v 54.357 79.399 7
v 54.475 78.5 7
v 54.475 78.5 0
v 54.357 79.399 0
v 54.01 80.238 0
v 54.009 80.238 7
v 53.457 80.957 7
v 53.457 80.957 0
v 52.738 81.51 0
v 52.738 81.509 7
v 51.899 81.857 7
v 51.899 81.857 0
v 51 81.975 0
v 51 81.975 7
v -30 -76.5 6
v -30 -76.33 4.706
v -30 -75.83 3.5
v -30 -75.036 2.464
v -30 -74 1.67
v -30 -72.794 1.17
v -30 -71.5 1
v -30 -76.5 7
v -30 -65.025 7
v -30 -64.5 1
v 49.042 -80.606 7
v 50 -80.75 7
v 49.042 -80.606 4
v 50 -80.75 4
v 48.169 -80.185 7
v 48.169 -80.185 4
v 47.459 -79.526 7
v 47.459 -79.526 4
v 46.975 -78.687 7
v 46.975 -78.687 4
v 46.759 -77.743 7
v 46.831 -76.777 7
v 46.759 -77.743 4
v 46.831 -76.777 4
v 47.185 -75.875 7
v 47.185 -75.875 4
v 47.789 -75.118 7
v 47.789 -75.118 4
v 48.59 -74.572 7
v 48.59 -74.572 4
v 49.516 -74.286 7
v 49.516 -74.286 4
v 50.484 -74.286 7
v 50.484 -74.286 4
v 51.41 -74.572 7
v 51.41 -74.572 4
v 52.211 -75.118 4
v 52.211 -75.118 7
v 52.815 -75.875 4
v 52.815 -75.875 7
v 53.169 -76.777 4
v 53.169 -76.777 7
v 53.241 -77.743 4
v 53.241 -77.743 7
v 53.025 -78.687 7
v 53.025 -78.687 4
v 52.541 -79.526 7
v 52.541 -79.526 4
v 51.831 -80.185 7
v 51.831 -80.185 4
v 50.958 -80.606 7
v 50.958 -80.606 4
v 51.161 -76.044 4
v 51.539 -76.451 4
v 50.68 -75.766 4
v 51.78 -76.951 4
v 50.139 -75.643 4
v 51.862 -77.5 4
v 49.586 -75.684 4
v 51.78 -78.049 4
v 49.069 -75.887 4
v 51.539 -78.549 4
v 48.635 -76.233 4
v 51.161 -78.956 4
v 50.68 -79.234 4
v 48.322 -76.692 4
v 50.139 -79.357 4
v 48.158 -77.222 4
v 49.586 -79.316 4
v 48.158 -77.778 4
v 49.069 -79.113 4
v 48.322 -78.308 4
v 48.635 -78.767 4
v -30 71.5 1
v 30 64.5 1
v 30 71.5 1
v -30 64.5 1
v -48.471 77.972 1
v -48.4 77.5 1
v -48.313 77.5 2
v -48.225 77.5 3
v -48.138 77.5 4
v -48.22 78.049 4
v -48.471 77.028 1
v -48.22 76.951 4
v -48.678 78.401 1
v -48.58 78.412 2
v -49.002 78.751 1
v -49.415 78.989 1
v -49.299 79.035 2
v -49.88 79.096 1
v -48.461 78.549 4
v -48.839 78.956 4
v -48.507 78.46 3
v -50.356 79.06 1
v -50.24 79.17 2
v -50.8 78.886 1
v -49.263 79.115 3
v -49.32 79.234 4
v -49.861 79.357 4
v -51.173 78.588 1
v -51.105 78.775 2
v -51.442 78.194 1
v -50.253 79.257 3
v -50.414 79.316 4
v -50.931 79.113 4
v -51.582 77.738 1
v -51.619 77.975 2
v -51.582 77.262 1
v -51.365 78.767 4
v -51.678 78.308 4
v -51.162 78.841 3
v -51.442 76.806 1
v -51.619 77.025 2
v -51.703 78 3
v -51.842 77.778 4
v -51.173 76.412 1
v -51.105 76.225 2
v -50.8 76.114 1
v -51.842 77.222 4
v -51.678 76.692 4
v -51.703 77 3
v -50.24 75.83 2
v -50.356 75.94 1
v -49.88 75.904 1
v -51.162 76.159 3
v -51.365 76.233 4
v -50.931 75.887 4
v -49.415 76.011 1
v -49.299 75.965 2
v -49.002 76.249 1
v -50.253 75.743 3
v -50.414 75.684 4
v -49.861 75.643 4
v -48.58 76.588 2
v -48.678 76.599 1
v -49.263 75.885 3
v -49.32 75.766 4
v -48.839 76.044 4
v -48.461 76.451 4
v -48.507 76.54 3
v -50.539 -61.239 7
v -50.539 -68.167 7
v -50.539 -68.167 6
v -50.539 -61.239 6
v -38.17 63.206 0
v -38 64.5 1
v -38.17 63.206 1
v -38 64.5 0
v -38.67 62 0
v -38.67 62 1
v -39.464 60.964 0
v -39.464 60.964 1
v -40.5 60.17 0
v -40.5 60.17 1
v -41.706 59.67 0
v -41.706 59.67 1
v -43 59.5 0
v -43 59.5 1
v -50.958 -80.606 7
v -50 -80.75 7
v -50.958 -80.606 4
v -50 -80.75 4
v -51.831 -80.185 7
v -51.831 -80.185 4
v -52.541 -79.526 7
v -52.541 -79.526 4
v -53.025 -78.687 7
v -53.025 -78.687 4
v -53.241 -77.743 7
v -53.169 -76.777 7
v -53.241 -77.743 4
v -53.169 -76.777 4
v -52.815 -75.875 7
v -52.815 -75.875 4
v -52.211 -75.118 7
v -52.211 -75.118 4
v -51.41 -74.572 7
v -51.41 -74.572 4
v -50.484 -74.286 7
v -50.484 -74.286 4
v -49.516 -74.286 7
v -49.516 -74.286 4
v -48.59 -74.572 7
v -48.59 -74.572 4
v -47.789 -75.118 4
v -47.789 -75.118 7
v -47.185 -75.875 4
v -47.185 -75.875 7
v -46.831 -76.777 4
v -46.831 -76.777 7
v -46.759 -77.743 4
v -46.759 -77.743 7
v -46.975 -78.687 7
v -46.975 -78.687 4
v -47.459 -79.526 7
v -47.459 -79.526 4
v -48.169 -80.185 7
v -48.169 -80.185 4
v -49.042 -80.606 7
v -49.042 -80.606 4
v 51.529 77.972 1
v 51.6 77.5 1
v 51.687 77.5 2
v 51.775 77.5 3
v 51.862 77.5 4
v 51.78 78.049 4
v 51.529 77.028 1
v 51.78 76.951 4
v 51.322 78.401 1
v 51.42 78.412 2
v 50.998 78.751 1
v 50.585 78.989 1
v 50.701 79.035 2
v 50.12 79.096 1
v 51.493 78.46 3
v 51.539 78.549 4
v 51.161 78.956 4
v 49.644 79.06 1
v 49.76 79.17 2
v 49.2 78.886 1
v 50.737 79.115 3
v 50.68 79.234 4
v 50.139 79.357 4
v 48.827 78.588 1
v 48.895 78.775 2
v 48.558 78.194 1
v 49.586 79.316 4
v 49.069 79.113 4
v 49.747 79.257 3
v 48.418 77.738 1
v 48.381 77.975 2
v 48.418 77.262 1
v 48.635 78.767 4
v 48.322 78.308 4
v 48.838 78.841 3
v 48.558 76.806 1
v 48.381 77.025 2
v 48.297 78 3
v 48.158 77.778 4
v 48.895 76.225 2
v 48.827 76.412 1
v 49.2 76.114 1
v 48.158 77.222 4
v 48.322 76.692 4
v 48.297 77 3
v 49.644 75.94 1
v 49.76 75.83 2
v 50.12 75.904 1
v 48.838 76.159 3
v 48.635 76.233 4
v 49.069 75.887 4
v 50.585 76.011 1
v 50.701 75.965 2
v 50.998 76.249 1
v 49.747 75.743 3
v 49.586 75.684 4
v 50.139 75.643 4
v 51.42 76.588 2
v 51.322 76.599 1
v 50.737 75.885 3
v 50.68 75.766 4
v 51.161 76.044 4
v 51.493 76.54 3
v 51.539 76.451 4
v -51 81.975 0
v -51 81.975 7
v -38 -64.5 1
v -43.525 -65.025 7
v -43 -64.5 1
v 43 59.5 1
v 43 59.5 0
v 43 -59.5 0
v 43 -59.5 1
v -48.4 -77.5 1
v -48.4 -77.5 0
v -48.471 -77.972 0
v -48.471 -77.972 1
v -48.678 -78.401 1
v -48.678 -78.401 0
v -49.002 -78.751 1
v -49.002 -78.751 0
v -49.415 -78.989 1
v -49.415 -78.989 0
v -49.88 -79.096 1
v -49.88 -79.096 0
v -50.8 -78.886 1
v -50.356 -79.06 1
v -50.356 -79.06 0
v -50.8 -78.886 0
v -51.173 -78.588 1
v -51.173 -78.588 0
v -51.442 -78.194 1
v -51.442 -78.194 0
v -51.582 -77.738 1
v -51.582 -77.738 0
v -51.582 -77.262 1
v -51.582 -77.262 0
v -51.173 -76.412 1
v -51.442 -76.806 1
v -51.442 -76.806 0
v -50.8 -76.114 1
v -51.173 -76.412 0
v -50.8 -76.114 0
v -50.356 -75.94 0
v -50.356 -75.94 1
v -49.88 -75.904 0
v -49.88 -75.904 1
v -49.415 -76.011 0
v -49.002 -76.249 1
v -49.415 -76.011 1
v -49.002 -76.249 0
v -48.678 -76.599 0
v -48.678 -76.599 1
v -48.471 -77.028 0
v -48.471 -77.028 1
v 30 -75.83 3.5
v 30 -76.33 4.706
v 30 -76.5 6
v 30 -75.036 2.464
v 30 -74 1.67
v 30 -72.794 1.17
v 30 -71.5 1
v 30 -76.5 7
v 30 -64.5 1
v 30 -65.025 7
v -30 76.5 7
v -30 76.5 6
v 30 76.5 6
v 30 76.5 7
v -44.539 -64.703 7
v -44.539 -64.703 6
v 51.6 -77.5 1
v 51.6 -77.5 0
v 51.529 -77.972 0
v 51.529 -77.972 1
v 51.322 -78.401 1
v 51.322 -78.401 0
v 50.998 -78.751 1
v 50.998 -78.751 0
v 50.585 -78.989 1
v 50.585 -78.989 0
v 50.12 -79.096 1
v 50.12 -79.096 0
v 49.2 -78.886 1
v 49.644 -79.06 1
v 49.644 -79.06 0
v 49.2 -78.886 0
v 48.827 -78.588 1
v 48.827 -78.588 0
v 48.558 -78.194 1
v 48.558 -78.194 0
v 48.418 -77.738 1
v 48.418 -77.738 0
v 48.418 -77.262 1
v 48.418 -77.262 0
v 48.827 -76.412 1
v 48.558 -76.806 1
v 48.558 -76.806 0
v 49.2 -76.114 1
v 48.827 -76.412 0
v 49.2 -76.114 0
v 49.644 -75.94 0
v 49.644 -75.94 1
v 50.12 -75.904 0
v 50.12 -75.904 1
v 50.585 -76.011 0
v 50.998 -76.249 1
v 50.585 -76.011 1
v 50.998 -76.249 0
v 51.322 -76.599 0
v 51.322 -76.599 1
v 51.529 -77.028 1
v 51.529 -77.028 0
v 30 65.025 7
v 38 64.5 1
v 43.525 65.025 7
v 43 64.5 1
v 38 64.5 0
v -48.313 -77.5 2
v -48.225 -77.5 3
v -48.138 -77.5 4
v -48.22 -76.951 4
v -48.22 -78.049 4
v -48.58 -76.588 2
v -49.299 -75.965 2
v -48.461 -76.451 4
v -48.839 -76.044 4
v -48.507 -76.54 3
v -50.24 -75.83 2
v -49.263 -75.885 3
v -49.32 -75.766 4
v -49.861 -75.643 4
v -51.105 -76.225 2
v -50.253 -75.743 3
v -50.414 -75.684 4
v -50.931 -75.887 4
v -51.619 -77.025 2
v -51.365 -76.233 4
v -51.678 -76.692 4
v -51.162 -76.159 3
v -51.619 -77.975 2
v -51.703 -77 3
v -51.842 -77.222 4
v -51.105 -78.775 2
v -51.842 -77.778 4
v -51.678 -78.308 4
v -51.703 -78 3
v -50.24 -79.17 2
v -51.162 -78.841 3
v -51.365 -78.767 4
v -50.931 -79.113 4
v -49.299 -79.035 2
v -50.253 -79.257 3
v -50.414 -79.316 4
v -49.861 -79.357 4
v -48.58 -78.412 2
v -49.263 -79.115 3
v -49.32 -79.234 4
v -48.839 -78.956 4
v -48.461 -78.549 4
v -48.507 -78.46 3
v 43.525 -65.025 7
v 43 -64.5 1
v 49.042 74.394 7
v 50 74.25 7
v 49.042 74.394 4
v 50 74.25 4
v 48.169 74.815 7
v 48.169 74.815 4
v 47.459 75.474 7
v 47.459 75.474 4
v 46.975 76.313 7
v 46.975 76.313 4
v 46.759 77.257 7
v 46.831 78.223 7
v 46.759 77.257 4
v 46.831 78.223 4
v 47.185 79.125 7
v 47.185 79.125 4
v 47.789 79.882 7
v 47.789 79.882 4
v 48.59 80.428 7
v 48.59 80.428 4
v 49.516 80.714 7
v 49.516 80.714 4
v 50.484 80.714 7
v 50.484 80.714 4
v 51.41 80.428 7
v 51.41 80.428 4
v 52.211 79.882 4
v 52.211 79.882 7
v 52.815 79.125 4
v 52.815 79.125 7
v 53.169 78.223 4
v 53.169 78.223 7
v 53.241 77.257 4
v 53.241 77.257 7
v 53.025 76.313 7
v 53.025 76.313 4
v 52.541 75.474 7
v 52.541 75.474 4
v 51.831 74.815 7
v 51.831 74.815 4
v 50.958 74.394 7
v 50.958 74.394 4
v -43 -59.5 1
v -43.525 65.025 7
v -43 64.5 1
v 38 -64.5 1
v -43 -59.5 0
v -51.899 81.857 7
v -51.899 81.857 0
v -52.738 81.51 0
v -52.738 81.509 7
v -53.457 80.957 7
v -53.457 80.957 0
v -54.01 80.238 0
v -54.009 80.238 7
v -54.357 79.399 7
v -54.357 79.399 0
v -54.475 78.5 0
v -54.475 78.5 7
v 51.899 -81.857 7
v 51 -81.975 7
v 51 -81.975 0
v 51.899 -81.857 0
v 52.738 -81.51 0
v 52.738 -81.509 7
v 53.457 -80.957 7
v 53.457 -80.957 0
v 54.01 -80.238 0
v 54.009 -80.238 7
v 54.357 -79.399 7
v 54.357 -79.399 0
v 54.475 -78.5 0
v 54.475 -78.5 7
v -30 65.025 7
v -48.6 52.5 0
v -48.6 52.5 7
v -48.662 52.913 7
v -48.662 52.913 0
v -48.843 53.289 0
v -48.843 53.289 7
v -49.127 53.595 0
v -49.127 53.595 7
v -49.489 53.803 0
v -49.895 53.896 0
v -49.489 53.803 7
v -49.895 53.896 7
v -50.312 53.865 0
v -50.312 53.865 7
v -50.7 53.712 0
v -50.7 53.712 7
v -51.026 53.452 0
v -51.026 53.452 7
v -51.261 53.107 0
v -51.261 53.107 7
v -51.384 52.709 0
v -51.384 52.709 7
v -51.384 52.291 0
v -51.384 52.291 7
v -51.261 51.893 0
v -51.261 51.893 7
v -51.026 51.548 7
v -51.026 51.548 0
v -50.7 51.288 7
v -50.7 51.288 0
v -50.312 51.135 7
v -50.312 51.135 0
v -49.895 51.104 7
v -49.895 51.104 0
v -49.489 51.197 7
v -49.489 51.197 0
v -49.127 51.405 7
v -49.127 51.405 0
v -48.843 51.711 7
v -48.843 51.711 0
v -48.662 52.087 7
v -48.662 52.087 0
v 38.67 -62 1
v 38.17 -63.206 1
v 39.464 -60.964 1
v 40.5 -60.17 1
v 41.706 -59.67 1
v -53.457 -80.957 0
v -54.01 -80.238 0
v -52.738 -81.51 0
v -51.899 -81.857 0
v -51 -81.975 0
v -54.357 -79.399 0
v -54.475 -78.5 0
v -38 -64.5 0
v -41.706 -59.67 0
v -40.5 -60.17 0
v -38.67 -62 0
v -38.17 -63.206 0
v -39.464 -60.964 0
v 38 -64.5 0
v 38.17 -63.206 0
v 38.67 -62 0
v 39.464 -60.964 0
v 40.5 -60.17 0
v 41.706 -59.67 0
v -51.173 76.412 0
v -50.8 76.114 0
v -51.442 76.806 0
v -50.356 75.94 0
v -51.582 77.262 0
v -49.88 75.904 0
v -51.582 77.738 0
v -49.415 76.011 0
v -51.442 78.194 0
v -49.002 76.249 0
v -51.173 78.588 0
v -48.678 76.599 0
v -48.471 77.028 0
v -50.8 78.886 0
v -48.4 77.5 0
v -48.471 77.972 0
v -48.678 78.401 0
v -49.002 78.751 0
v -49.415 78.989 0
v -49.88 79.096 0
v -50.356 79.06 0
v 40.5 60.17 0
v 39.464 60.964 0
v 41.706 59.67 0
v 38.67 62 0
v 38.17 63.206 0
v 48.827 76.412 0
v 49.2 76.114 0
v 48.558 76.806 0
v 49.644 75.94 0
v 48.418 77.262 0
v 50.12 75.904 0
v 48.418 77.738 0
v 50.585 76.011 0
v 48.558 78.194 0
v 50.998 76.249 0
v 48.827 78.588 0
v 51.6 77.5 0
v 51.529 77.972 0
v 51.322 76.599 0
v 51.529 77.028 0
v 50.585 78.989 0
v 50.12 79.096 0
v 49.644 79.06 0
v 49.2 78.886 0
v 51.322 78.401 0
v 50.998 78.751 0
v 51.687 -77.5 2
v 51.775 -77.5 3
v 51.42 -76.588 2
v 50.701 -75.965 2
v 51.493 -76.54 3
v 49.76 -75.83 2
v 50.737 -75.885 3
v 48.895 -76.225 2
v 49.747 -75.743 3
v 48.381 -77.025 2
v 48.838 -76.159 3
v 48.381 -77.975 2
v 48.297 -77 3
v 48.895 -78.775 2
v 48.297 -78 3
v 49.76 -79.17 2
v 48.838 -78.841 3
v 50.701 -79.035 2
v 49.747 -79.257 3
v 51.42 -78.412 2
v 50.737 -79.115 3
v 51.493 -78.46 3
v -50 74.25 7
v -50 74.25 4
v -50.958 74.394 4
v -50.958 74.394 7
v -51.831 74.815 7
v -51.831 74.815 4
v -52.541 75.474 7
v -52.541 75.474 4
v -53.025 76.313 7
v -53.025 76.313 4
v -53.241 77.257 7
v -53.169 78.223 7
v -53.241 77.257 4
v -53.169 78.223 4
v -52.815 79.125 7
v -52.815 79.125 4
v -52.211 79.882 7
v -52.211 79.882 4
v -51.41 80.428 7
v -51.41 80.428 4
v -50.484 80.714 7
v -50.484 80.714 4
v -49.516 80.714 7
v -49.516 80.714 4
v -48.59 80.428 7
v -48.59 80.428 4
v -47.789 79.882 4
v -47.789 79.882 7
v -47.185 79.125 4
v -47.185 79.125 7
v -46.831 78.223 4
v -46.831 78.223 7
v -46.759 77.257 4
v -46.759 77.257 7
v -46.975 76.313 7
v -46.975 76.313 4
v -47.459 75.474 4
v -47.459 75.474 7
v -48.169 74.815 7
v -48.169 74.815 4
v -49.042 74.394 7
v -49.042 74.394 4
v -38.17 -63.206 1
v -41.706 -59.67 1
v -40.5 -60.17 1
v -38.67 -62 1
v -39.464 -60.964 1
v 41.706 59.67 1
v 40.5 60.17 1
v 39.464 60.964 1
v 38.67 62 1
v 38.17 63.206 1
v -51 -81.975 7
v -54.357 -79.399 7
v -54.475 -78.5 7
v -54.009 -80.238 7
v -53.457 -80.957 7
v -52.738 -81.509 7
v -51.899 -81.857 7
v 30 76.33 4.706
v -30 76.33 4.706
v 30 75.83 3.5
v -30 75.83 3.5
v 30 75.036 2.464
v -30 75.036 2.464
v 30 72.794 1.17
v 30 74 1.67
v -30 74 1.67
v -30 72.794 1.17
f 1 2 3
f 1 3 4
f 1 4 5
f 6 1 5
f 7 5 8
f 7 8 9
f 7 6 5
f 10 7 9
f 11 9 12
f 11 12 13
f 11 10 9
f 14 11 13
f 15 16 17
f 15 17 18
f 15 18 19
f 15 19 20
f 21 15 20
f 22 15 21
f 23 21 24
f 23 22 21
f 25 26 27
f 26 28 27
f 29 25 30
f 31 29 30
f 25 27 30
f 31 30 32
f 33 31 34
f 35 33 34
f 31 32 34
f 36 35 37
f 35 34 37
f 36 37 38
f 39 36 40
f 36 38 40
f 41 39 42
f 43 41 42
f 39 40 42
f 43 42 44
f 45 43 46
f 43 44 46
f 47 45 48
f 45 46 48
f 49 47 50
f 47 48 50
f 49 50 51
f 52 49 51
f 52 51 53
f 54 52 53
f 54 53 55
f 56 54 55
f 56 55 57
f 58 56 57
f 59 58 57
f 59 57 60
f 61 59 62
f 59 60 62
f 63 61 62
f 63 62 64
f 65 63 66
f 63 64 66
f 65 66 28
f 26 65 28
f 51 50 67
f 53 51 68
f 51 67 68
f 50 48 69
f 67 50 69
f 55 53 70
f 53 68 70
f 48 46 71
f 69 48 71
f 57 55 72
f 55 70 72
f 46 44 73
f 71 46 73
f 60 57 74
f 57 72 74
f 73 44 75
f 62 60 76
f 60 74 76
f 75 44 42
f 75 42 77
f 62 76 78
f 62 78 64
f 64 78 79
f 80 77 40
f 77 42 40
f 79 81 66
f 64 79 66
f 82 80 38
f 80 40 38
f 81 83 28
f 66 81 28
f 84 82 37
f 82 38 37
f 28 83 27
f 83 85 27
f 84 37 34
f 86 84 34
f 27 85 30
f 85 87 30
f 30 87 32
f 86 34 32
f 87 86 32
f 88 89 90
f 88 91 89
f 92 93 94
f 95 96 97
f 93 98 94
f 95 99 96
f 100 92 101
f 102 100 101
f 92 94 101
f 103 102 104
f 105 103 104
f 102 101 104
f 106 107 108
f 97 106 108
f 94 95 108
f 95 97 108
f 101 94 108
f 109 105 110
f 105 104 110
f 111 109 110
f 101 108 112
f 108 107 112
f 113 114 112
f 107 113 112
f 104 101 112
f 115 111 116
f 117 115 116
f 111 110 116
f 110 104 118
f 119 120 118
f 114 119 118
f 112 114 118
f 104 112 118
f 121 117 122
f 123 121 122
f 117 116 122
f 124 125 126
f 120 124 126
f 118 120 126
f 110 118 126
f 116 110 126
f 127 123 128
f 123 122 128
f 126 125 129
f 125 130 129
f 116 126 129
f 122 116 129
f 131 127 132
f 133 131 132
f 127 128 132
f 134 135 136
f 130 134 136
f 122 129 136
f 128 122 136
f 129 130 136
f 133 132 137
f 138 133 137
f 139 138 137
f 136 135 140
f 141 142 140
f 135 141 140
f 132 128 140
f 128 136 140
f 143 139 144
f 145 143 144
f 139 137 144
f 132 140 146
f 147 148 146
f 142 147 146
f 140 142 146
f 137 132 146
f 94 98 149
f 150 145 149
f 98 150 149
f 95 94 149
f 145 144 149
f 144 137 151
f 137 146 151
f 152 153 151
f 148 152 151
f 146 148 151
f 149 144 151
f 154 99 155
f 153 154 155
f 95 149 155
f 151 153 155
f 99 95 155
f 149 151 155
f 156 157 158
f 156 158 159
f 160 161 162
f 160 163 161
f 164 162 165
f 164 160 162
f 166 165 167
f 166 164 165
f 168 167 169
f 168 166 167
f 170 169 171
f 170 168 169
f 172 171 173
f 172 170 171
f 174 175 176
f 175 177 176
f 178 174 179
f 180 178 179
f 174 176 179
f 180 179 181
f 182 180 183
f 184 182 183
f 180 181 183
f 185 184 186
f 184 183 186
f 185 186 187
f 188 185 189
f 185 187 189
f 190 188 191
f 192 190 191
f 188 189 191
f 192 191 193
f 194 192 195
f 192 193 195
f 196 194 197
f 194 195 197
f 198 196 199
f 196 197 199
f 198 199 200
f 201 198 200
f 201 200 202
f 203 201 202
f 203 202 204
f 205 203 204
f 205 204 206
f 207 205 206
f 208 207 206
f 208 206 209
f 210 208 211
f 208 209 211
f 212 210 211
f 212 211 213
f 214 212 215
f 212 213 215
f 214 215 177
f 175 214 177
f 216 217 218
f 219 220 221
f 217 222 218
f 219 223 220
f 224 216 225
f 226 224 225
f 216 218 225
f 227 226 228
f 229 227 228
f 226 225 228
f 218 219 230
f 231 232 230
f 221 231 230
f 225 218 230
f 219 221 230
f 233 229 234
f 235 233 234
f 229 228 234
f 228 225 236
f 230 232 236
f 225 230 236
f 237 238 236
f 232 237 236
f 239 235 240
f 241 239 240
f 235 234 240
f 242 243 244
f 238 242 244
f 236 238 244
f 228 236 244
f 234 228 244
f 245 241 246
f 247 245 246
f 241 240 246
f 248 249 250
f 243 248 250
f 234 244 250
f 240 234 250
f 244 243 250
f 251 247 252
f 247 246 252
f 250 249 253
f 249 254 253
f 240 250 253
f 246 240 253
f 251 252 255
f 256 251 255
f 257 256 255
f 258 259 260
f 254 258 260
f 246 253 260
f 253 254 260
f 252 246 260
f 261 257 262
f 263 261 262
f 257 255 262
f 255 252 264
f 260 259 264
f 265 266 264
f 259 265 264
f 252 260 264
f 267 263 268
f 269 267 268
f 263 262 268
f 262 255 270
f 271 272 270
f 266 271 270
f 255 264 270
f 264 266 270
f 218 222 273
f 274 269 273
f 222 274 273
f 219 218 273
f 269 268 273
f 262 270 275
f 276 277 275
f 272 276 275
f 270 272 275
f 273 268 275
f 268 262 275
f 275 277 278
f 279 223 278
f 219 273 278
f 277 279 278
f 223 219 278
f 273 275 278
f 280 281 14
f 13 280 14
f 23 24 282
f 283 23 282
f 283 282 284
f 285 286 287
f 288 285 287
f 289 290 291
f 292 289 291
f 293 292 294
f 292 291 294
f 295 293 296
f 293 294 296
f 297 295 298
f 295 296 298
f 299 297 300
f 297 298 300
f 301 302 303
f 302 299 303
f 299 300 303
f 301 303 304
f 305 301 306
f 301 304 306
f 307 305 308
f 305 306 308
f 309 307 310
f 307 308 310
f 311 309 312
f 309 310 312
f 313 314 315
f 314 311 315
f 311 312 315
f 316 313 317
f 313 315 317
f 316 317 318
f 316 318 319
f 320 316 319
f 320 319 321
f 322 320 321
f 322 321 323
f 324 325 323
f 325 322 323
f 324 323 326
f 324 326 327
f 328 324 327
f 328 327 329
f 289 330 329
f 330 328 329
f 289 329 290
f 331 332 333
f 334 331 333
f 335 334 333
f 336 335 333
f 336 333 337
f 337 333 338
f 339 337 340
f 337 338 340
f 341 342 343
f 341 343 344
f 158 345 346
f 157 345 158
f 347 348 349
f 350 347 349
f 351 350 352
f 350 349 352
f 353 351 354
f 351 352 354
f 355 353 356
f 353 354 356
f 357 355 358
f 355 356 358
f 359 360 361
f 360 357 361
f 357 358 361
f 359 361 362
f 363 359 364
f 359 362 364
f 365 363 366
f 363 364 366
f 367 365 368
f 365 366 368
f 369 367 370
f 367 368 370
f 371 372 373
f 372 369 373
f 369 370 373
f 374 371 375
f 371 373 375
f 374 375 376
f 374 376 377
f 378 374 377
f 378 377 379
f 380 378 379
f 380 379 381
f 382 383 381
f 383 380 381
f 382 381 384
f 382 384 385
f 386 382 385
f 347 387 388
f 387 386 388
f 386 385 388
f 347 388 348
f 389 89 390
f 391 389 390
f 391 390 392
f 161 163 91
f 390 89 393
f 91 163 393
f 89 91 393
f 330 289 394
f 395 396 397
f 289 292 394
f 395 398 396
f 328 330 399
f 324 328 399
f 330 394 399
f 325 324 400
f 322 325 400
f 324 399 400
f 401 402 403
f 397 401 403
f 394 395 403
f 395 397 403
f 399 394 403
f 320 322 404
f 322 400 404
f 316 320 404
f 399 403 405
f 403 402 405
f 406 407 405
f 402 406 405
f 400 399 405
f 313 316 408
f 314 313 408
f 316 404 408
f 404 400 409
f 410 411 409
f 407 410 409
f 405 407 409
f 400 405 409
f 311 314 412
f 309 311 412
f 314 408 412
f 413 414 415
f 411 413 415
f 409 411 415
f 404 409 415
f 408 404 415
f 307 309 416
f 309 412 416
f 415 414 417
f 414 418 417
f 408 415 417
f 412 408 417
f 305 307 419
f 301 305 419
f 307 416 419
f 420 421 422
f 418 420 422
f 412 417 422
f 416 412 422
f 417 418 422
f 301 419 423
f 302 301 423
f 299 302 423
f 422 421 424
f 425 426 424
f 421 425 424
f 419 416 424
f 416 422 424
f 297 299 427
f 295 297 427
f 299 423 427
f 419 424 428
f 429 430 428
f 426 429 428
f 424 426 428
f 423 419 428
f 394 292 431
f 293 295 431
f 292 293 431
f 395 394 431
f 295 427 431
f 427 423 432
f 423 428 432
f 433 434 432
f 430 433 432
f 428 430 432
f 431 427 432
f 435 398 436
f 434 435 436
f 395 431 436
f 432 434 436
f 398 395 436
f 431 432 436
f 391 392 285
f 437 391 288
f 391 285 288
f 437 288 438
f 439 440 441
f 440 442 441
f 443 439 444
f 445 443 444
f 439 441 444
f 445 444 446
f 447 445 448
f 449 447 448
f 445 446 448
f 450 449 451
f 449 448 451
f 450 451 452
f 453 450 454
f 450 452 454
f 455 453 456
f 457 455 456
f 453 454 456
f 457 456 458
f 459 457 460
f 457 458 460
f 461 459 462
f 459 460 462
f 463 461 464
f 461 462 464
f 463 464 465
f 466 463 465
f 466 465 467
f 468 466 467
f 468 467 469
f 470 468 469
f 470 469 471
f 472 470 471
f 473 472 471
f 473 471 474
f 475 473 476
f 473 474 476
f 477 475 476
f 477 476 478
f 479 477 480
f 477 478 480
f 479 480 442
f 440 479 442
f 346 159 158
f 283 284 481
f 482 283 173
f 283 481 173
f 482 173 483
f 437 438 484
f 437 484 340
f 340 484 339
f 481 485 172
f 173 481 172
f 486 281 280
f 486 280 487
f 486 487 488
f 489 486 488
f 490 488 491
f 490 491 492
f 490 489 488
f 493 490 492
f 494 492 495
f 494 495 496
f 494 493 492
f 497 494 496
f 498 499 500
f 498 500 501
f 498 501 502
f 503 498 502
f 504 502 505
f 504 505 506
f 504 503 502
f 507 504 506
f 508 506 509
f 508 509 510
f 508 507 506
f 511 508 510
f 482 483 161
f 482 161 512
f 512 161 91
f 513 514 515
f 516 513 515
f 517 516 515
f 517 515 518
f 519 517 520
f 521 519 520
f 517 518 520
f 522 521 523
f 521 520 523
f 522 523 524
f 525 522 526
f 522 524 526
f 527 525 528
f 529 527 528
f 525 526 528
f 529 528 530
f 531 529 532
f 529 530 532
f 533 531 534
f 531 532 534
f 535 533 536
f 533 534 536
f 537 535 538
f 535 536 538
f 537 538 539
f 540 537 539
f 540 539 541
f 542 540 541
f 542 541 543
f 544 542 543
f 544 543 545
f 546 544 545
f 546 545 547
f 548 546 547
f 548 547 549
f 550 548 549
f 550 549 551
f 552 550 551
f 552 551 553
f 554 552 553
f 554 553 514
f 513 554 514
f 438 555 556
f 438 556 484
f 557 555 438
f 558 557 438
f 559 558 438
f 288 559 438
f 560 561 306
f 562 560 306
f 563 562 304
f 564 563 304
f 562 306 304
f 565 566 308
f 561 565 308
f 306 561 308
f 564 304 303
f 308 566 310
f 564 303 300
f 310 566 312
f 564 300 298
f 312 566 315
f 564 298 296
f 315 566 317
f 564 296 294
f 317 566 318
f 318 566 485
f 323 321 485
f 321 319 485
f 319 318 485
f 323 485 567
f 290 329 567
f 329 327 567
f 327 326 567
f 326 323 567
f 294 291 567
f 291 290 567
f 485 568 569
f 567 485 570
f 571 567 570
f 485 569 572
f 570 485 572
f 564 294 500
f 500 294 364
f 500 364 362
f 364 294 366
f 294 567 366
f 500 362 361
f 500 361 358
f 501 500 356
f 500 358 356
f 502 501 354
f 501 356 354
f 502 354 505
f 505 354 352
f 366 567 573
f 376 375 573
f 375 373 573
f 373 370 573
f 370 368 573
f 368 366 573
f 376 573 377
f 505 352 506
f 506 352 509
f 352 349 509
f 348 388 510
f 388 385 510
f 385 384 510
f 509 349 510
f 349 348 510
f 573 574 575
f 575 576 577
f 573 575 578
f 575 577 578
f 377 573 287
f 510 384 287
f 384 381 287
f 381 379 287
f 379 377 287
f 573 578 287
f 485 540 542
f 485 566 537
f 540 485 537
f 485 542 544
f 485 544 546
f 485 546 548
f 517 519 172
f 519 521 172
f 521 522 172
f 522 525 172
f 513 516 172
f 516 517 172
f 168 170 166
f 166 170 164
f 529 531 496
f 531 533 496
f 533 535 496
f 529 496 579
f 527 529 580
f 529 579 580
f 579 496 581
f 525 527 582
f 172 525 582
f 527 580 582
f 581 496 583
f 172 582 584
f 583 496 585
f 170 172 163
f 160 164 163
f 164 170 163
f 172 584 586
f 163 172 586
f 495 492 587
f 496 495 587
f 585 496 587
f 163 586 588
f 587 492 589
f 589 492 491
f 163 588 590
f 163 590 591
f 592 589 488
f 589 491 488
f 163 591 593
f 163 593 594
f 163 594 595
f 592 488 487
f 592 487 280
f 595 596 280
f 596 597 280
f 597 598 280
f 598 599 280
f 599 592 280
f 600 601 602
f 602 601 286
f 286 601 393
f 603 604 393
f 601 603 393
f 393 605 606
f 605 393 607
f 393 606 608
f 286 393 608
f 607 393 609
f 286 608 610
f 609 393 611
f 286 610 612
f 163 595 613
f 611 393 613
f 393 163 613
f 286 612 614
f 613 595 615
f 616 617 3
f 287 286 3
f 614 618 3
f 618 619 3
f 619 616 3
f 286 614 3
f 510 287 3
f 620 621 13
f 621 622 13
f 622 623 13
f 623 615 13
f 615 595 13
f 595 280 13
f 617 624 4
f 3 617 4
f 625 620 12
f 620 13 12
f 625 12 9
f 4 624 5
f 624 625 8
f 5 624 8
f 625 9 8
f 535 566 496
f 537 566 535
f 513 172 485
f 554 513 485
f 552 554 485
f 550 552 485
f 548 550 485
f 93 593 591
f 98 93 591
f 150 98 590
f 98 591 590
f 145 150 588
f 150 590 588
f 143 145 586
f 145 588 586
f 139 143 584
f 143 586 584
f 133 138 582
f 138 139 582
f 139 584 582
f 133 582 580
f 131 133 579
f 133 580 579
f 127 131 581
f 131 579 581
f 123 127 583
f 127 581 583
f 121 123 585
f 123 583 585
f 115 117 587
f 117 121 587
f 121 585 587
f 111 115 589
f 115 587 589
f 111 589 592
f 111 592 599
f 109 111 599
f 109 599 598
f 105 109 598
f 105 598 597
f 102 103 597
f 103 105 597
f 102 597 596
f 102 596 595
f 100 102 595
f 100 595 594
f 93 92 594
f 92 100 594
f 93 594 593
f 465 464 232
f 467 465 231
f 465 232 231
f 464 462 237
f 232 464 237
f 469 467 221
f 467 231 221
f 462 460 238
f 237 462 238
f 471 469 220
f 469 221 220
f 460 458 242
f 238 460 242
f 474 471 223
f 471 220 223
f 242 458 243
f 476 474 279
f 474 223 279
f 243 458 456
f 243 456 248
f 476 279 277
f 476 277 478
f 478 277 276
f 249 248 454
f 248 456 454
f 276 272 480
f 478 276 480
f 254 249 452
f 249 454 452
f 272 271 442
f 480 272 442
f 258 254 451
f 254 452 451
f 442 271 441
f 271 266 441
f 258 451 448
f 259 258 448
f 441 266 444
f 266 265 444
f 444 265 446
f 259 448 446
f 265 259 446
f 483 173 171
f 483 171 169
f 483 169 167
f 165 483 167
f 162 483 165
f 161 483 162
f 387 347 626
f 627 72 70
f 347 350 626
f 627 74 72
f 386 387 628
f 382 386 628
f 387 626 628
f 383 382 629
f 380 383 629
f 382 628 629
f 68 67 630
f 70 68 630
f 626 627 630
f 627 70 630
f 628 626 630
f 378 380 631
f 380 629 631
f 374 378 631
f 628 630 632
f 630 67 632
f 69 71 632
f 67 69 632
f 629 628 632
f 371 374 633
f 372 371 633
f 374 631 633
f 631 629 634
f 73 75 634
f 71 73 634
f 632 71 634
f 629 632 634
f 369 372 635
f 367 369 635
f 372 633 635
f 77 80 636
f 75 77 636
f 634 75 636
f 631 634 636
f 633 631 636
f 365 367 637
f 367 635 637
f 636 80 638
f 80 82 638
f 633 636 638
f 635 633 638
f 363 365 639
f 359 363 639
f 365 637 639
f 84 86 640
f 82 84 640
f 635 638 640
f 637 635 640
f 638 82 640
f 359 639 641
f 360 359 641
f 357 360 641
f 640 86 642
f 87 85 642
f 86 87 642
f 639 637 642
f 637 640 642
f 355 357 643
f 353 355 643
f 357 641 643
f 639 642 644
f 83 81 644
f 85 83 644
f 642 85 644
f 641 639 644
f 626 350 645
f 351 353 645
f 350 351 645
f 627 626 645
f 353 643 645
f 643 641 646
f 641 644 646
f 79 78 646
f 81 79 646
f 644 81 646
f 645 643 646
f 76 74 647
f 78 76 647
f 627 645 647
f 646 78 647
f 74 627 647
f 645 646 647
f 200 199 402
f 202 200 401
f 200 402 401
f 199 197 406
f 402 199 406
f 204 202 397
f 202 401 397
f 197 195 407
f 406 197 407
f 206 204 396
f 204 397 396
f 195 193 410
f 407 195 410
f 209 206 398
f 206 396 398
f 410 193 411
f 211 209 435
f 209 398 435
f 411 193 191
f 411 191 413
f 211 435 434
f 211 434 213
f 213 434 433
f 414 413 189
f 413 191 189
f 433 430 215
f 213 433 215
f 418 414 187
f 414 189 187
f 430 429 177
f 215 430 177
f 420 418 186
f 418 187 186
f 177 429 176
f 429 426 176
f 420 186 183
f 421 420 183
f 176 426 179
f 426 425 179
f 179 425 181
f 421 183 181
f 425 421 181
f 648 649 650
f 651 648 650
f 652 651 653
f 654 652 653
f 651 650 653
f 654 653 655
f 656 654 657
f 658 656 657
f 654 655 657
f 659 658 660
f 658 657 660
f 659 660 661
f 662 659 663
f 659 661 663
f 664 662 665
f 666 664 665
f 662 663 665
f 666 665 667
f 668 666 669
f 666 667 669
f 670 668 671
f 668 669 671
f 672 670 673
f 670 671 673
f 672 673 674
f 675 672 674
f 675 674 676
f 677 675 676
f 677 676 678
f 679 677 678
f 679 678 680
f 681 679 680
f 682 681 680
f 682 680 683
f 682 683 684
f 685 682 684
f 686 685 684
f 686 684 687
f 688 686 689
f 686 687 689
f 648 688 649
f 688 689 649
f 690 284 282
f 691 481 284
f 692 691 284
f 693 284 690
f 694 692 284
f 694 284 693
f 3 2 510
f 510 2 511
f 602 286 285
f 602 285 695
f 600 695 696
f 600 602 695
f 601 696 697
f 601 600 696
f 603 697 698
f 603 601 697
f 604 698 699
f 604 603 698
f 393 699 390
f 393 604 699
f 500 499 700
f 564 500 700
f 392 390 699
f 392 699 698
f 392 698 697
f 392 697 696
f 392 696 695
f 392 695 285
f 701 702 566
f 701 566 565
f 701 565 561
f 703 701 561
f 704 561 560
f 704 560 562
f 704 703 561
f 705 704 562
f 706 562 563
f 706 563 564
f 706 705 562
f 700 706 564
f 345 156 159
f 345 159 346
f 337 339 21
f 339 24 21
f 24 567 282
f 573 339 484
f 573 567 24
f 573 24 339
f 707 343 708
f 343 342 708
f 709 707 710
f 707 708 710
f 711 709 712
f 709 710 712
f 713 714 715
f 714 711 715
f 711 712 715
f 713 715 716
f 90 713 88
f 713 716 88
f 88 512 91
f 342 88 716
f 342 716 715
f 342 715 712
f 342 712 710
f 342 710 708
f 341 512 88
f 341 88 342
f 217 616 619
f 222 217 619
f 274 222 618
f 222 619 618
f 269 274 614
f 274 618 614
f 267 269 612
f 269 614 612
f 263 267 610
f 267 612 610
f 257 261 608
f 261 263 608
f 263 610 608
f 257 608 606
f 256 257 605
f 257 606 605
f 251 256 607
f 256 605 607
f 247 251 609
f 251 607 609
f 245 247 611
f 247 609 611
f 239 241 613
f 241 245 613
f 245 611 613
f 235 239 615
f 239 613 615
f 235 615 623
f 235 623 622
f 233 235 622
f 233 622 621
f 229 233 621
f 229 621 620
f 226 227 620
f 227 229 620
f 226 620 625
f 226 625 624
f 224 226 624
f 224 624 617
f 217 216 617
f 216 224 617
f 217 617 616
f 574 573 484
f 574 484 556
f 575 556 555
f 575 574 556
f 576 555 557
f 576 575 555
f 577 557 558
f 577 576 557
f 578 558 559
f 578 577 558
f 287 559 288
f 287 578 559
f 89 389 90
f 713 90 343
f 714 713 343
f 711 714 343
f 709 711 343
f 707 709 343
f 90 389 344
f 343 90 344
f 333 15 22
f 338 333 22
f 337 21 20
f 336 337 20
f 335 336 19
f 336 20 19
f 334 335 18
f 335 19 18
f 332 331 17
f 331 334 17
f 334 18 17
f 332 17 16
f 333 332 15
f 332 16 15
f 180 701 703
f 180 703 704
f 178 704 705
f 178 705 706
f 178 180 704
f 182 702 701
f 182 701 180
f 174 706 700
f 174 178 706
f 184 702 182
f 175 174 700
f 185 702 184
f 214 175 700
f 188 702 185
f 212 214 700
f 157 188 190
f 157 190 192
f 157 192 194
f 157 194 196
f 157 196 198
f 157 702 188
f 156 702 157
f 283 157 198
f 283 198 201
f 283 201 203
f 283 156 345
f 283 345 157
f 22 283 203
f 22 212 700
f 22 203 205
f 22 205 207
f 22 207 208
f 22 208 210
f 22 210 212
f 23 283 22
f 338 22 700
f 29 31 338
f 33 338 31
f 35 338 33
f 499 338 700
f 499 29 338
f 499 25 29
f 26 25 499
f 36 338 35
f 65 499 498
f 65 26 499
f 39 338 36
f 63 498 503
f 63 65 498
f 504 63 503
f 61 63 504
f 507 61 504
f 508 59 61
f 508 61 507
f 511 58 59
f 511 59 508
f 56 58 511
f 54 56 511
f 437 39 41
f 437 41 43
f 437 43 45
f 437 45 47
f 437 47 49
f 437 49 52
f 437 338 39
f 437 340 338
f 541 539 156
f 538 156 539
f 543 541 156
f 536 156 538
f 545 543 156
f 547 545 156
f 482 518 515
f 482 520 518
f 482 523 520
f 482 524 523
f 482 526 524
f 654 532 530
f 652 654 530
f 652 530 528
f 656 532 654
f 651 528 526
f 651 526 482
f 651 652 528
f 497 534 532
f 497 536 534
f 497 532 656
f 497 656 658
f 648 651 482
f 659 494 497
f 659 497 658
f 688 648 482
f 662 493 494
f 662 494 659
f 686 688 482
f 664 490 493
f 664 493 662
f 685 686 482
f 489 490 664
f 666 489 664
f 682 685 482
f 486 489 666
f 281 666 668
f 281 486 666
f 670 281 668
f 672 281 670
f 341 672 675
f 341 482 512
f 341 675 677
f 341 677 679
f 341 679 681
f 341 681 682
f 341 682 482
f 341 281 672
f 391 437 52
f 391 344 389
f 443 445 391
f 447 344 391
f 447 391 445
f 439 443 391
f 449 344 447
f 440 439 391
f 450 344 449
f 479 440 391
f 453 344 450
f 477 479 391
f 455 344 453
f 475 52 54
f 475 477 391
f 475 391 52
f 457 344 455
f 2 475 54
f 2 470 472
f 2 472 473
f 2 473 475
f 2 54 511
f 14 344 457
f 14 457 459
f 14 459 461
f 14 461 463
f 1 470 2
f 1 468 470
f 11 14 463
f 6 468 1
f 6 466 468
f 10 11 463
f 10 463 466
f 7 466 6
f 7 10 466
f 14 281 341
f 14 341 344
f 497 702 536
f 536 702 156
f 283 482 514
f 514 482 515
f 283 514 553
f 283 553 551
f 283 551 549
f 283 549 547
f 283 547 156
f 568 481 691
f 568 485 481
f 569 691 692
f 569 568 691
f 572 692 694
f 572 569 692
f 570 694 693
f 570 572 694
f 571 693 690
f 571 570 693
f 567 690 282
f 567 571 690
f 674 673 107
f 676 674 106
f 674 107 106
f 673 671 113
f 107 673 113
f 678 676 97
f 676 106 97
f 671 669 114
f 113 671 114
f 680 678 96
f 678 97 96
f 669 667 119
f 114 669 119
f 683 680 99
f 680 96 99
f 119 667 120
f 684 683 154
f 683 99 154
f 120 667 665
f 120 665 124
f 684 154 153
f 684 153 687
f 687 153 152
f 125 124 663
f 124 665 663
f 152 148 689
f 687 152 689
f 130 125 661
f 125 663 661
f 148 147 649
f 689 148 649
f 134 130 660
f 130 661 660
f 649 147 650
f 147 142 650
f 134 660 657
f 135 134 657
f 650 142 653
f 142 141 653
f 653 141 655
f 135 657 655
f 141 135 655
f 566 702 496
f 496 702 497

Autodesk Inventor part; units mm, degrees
ref_plane "YZ Plane" through (0, 0, 0) normal (1, 0, 0) x (0, 1, 0)
ref_plane "XZ Plane" through (0, 0, 0) normal (0, 1, 0) x (-1, 0, 0)
ref_plane "XY Plane" through (0, 0, 0) normal (0, 0, 1) x (1, 0, 0)
ref_plane "Arbeitsebene1" through (0, 0, 0) normal (0, 0, 1) x (1, 0, 0)
sketch "Skizze1" plane through (0, 0, 0) normal (0, 0, 1) x (1, 0, 0)
  line L0 (50, 77.5) -> (-50, 77.5) construction
  line L1 (-50, 77.5) -> (-50, -77.5) construction
  line L2 (-50, -77.5) -> (50, -77.5) construction
  line L3 (50, -77.5) -> (50, 77.5) construction
  line L4 (51, 82.5) -> (-51, 82.5)
  line L5 (-55, 78.5) -> (-55, -78.5)
  line L6 (-51, -82.5) -> (51, -82.5)
  line L7 (55, -78.5) -> (55, 78.5)
  circle A0 centre (50, 77.5) radius 1.6
  circle A1 centre (50, -77.5) radius 1.6
  circle A2 centre (-50, -77.5) radius 1.6
  circle A3 centre (-50, 77.5) radius 1.6
  arc A4 (55, 78.5) -> (51, 82.5) centre (51, 78.5) ccw
  arc A5 (51, -82.5) -> (55, -78.5) centre (51, -78.5) ccw
  arc A6 (-55, -78.5) -> (-51, -82.5) centre (-51, -78.5) ccw
  arc A7 (-51, 82.5) -> (-55, 78.5) centre (-51, 78.5) ccw
  line L8 (43, 64.5) -> (43, -64.5)
  line L9 (-43, -64.5) -> (-43, 64.5)
  line L10 (-43, 63.5) -> (-43, 64.5)
  line L11 (-43, 64.5) -> (43, 64.5)
  line L12 (43, 64.5) -> (43, 74.0537)
  line L13 (-43, -64.5) -> (43, -64.5)
  circle A8 centre (-43, 64.5) radius 5
  circle A9 centre (43, 64.5) radius 5
  circle A10 centre (43, -64.5) radius 5
  circle A11 centre (-43, -64.5) radius 5
  point P0 (0, 0)
  point P1 (-43, -59.5)
  point P2 (-43, 59.5)
  point P3 (-38, 64.5)
  point P4 (38, 64.5)
  point P5 (43, 59.5)
  point P6 (43, -59.5)
  point P7 (38, -64.5)
  point P8 (-38, -64.5)
  dimension "d1" = 3.2
  dimension "d2" = 3.2
  dimension "d3" = 3.2
  dimension "d4" = 3.2
  dimension "d5" = 4
  dimension "d6" = 86
  dimension "d10" = 10
  dimension "d11" = 10
  dimension "d12" = 10
  dimension "d13" = 10
  dimension "d31" = 43
  dimension "d32" = 129
  dimension "d33" = 100
  dimension "d34" = 155
  dimension "d35" = 64.5
  dimension "d36" = 55
  dimension "d37" = 110
  dimension "d38" = 165
  dimension "d39" = 82.5
extrude "Extrusion1" add sketch "Skizze1" along normal blind 1 contours A4 L7 A5 L6 A6 L5 A7 L4 | L12 A9 L8 | L8 A9 L11 | L11 A9 L12 | A10 L13 L8 | L8 L13 A10 | A8 L9 L11 | L11 L9 A8 | A11 L9 L13 | L13 L9 A11
sketch "Skizze2" plane through (0, 0, 1) normal (0, 0, 1) x (1, 0, 0)
  arc A0 (-51, 82.5) -> (-55, 78.5) centre (-51, 78.5) ccw projected
  line L0 (-55, 78.5) -> (-55, -78.5) projected
  arc A1 (-55, -78.5) -> (-51, -82.5) centre (-51, -78.5) ccw projected
  line L1 (-51, -82.5) -> (51, -82.5) projected
  arc A2 (51, -82.5) -> (55, -78.5) centre (51, -78.5) ccw projected
  line L2 (55, -78.5) -> (55, 78.5) projected
  arc A3 (55, 78.5) -> (51, 82.5) centre (51, 78.5) ccw projected
  line L3 (51, 82.5) -> (-51, 82.5) projected
  arc A4 (-38, -64.5) -> (-43, -59.5) centre (-43, -64.5) ccw projected
  line L4 (-43, -59.5) -> (-43, 59.5) projected
  arc A5 (-43, 59.5) -> (-38, 64.5) centre (-43, 64.5) ccw projected
  line L5 (-38, 64.5) -> (38, 64.5) projected
  arc A6 (38, 64.5) -> (43, 59.5) centre (43, 64.5) ccw projected
  line L6 (43, 59.5) -> (43, -59.5) projected
  arc A7 (43, -59.5) -> (38, -64.5) centre (43, -64.5) ccw projected
  line L7 (38, -64.5) -> (-38, -64.5) projected
  circle A8 centre (-50, 77.5) radius 1.6 projected
  circle A9 centre (-50, -77.5) radius 1.6 projected
  circle A10 centre (50, -77.5) radius 1.6 projected
  circle A11 centre (50, 77.5) radius 1.6 projected
  line L8 (-43, 64.5) -> (43, 64.5)
  line L9 (43, 64.5) -> (43, -64.5)
  line L10 (43, -64.5) -> (-43, -64.5)
  line L11 (-43, -64.5) -> (-43, 64.5)
  point P0 (-43, 59.5)
  point P1 (43, -59.5)
  point P2 (38, -64.5)
  point P3 (-43, -59.5)
extrude "Extrusion2" add sketch "Skizze2" along normal blind 6 draft -5
sketch "Skizze3" plane through (0, 0, 7) normal (0, 0, 1) x (1, 0, 0)
  line L0 (-44.539, -64.7031) -> (-50.539, -68.1672)
  line L1 (-50.539, -68.1672) -> (-50.539, -61.239)
  line L2 (-50.539, -61.239) -> (-44.539, -64.7031)
  line L3 (39.5249, 74.6999) -> (39.5249, -55.3499) projected
  point P0 (0, 0)
  point P1 (-48.539, -64.7031)
  dimension "d23" = 6
extrude "Extrusion3" cut sketch "Skizze3" against normal blind 1
sketch "Skizze4" plane through (0, 0, 7) normal (0, 0, 1) x (1, 0, 0)
  line L0 (-44.539, -64.7031) -> (-50.539, -68.1672) projected
  line L1 (-50.539, -61.239) -> (-44.539, -64.7031) projected
  circle A0 centre (-50, 77.5) radius 2.1249 projected
  circle A1 centre (-50, -77.5) radius 2.1249 projected
  circle A2 centre (50, -77.5) radius 2.1249 projected
  circle A3 centre (50, 77.5) radius 2.1249 projected
  line L2 (-54.4751, -78.5) -> (-54.4751, 78.5) projected
  arc A4 (-54.4751, -78.5) -> (-51, -81.9751) centre (-51, -78.5) ccw projected
  line L3 (51, -81.9751) -> (-51, -81.9751) projected
  arc A5 (51, -81.9751) -> (54.4751, -78.5) centre (51, -78.5) ccw projected
  line L4 (54.4751, 78.5) -> (54.4751, -78.5) projected
  arc A6 (54.4751, 78.5) -> (51, 81.9751) centre (51, 78.5) ccw projected
  line L5 (-51, 81.9751) -> (51, 81.9751) projected
  arc A7 (-51, 81.9751) -> (-54.4751, 78.5) centre (-51, 78.5) ccw projected
  circle A8 centre (-50, -77.5) radius 1.6 projected
  circle A9 centre (50, -77.5) radius 1.6 projected
  circle A10 centre (50, 77.5) radius 1.6 projected
  circle A11 centre (-50, 77.5) radius 1.6 projected
  line L6 (-50.539, -68.1672) -> (-50.539, -61.239) projected
  point P0 (0, 0)
hole "Bohrung1" at (-50, -77.5, 7) at (50, -77.5, 7) at (50, 77.5, 7) at (-50, 77.5, 7) direction (0, 0, -1) diameter 3.2 end through all counterbore diameter 6.5 counterbore depth 3
sketch "Skizze5" plane through (0, 0, 0) normal (1, 0, 0) x (0, 1, 0)
  line L0 (64.5, 1) -> (65.0249, 7) projected
  line L1 (64.5, 1) -> (71.5, 1)
  line L2 (76.5, 6) -> (76.5, 16)
  line L3 (76.5, 16) -> (64.5, 16)
  line L4 (64.5, 16) -> (64.5, 1)
  line L5 (-64.5, 0) -> (-64.5, 1) projected
  line L6 (-64.5, 1) -> (-71.5, 1)
  line L7 (-76.5, 6) -> (-76.5, 12.183)
  line L8 (-76.5, 12.183) -> (-64.5, 12.183)
  line L9 (-64.5, 12.183) -> (-64.5, 1)
  arc A0 (-76.5, 6) -> (-71.5, 1) centre (-71.5, 6) ccw
  arc A1 (71.5, 1) -> (76.5, 6) centre (71.5, 6) ccw
  point P0 (0, 0)
  point P1 (76.5, 1)
  dimension "d40" = 12
  dimension "d41" = 15
  dimension "d42" = 12
  dimension "d43" = 5
extrude "Extrusion4" cut sketch "Skizze5" along normal mid plane 60
sketch "Skizze6" plane through (0, 0, 7) normal (0, 0, 1) x (1, 0, 0)
  circle A0 centre (-50, 77.5) radius 1.8625 projected
  line L0 (-43.5249, -65.0249) -> (-43.5249, 65.0249) projected
  line L1 (-43.5249, 65.0249) -> (-37.8681, 65.0249) construction
  circle A1 centre (-50, 52.5) radius 1.4
  point P0 (0, 0)
  dimension "d48" = 2.8
  dimension "d51" = 25
extrude "Extrusion5" cut sketch "Skizze6" against normal blind 60 contours A1
sketch "Skizze7" plane through (0, 0, 7) normal (0, 0, 1) x (1, 0, 0)
  circle A0 centre (-50, 52.5) radius 1.4 projected
  line L0 (-54.4751, -78.5) -> (-54.4751, 78.5) projected
  arc A1 (-54.4751, -78.5) -> (-51, -81.9751) centre (-51, -78.5) ccw projected
  line L1 (51, -81.9751) -> (-51, -81.9751) projected
  arc A2 (51, -81.9751) -> (54.4751, -78.5) centre (51, -78.5) ccw projected
  line L2 (54.4751, 78.5) -> (54.4751, -78.5) projected
  arc A3 (54.4751, 78.5) -> (51, 81.9751) centre (51, 78.5) ccw projected
  line L3 (-51, 81.9751) -> (51, 81.9751) projected
  arc A4 (-51, 81.9751) -> (-54.4751, 78.5) centre (-51, 78.5) ccw projected
  line L4 (-44.539, -64.7031) -> (-50.539, -68.1672) projected
  line L5 (-50.539, -68.1672) -> (-50.539, -61.239) projected
  line L6 (-50.539, -61.239) -> (-44.539, -64.7031) projected
  circle A5 centre (-50, 77.5) radius 3.25 projected
  circle A6 centre (50, -77.5) radius 3.25 projected
  circle A7 centre (-50, -77.5) radius 3.25 projected
  circle A8 centre (50, 77.5) radius 3.25 projected
  line L7 (30, -65.0249) -> (30, -76.5) projected
  line L8 (30, -76.5) -> (-30, -76.5) projected
  line L9 (-30, -76.5) -> (-30, -65.0249) projected
  line L10 (-30, -65.0249) -> (-43.5249, -65.0249) projected
  line L11 (-43.5249, -65.0249) -> (-43.5249, 65.0249) projected
  line L12 (-43.5249, 65.0249) -> (-30, 65.0249) projected
  line L13 (-30, 65.0249) -> (-30, 76.5) projected
  line L14 (-30, 76.5) -> (30, 76.5) projected
  line L15 (30, 76.5) -> (30, 65.0249) projected
  line L16 (30, 65.0249) -> (43.5249, 65.0249) projected
  line L17 (43.5249, 65.0249) -> (43.5249, -65.0249) projected
  line L18 (43.5249, -65.0249) -> (30, -65.0249) projected
  line L19 (-50, -81.5) -> (50, -81.5)
  line L20 (54, -77.5) -> (54, 77.5)
  line L21 (50, 81.5) -> (-50, 81.5)
  line L22 (-54, 77.5) -> (-54, -77.5)
  line L23 (-54, -81.5) -> (54, 81.5) construction
  line L24 (54, -81.5) -> (-54, 81.5) construction
  arc A9 (54, 77.5) -> (50, 81.5) centre (50, 77.5) ccw
  arc A10 (-50, 81.5) -> (-54, 77.5) centre (-50, 77.5) ccw
  arc A11 (-54, -77.5) -> (-50, -81.5) centre (-50, -77.5) ccw
  arc A12 (50, -81.5) -> (54, -77.5) centre (50, -77.5) ccw
  point P0 (0, 0)
  dimension "d52" = 108
  dimension "d53" = 163
  dimension "d54" = 4
extrude "Extrusion6" cut sketch "Skizze7" against normal blind 10 contours A0 | L0 A4 L3 A3 L2 A2 L1 A1 | L4 L5 L6 | A5 | A6 | A7 | A8 | L7 L8 L9 L10 L11 L12 L13 L14 L15 L16 L17 L18 | A11 L22 A10 L21 A9 L20 A12 L19 keep common part
equation "\"d11\" = d10"
equation "\"d12\" = d10"
equation "\"d13\" = d10"
equation "\"d31\" = 0.5 * d6"
equation "\"d35\" = 0.5 * d32"
equation "\"d36\" = 0.5 * d37"
equation "\"d39\" = 0.5 * d38"
properties part number "30_xystage_gp-010b_adapter_multiwellplate"
